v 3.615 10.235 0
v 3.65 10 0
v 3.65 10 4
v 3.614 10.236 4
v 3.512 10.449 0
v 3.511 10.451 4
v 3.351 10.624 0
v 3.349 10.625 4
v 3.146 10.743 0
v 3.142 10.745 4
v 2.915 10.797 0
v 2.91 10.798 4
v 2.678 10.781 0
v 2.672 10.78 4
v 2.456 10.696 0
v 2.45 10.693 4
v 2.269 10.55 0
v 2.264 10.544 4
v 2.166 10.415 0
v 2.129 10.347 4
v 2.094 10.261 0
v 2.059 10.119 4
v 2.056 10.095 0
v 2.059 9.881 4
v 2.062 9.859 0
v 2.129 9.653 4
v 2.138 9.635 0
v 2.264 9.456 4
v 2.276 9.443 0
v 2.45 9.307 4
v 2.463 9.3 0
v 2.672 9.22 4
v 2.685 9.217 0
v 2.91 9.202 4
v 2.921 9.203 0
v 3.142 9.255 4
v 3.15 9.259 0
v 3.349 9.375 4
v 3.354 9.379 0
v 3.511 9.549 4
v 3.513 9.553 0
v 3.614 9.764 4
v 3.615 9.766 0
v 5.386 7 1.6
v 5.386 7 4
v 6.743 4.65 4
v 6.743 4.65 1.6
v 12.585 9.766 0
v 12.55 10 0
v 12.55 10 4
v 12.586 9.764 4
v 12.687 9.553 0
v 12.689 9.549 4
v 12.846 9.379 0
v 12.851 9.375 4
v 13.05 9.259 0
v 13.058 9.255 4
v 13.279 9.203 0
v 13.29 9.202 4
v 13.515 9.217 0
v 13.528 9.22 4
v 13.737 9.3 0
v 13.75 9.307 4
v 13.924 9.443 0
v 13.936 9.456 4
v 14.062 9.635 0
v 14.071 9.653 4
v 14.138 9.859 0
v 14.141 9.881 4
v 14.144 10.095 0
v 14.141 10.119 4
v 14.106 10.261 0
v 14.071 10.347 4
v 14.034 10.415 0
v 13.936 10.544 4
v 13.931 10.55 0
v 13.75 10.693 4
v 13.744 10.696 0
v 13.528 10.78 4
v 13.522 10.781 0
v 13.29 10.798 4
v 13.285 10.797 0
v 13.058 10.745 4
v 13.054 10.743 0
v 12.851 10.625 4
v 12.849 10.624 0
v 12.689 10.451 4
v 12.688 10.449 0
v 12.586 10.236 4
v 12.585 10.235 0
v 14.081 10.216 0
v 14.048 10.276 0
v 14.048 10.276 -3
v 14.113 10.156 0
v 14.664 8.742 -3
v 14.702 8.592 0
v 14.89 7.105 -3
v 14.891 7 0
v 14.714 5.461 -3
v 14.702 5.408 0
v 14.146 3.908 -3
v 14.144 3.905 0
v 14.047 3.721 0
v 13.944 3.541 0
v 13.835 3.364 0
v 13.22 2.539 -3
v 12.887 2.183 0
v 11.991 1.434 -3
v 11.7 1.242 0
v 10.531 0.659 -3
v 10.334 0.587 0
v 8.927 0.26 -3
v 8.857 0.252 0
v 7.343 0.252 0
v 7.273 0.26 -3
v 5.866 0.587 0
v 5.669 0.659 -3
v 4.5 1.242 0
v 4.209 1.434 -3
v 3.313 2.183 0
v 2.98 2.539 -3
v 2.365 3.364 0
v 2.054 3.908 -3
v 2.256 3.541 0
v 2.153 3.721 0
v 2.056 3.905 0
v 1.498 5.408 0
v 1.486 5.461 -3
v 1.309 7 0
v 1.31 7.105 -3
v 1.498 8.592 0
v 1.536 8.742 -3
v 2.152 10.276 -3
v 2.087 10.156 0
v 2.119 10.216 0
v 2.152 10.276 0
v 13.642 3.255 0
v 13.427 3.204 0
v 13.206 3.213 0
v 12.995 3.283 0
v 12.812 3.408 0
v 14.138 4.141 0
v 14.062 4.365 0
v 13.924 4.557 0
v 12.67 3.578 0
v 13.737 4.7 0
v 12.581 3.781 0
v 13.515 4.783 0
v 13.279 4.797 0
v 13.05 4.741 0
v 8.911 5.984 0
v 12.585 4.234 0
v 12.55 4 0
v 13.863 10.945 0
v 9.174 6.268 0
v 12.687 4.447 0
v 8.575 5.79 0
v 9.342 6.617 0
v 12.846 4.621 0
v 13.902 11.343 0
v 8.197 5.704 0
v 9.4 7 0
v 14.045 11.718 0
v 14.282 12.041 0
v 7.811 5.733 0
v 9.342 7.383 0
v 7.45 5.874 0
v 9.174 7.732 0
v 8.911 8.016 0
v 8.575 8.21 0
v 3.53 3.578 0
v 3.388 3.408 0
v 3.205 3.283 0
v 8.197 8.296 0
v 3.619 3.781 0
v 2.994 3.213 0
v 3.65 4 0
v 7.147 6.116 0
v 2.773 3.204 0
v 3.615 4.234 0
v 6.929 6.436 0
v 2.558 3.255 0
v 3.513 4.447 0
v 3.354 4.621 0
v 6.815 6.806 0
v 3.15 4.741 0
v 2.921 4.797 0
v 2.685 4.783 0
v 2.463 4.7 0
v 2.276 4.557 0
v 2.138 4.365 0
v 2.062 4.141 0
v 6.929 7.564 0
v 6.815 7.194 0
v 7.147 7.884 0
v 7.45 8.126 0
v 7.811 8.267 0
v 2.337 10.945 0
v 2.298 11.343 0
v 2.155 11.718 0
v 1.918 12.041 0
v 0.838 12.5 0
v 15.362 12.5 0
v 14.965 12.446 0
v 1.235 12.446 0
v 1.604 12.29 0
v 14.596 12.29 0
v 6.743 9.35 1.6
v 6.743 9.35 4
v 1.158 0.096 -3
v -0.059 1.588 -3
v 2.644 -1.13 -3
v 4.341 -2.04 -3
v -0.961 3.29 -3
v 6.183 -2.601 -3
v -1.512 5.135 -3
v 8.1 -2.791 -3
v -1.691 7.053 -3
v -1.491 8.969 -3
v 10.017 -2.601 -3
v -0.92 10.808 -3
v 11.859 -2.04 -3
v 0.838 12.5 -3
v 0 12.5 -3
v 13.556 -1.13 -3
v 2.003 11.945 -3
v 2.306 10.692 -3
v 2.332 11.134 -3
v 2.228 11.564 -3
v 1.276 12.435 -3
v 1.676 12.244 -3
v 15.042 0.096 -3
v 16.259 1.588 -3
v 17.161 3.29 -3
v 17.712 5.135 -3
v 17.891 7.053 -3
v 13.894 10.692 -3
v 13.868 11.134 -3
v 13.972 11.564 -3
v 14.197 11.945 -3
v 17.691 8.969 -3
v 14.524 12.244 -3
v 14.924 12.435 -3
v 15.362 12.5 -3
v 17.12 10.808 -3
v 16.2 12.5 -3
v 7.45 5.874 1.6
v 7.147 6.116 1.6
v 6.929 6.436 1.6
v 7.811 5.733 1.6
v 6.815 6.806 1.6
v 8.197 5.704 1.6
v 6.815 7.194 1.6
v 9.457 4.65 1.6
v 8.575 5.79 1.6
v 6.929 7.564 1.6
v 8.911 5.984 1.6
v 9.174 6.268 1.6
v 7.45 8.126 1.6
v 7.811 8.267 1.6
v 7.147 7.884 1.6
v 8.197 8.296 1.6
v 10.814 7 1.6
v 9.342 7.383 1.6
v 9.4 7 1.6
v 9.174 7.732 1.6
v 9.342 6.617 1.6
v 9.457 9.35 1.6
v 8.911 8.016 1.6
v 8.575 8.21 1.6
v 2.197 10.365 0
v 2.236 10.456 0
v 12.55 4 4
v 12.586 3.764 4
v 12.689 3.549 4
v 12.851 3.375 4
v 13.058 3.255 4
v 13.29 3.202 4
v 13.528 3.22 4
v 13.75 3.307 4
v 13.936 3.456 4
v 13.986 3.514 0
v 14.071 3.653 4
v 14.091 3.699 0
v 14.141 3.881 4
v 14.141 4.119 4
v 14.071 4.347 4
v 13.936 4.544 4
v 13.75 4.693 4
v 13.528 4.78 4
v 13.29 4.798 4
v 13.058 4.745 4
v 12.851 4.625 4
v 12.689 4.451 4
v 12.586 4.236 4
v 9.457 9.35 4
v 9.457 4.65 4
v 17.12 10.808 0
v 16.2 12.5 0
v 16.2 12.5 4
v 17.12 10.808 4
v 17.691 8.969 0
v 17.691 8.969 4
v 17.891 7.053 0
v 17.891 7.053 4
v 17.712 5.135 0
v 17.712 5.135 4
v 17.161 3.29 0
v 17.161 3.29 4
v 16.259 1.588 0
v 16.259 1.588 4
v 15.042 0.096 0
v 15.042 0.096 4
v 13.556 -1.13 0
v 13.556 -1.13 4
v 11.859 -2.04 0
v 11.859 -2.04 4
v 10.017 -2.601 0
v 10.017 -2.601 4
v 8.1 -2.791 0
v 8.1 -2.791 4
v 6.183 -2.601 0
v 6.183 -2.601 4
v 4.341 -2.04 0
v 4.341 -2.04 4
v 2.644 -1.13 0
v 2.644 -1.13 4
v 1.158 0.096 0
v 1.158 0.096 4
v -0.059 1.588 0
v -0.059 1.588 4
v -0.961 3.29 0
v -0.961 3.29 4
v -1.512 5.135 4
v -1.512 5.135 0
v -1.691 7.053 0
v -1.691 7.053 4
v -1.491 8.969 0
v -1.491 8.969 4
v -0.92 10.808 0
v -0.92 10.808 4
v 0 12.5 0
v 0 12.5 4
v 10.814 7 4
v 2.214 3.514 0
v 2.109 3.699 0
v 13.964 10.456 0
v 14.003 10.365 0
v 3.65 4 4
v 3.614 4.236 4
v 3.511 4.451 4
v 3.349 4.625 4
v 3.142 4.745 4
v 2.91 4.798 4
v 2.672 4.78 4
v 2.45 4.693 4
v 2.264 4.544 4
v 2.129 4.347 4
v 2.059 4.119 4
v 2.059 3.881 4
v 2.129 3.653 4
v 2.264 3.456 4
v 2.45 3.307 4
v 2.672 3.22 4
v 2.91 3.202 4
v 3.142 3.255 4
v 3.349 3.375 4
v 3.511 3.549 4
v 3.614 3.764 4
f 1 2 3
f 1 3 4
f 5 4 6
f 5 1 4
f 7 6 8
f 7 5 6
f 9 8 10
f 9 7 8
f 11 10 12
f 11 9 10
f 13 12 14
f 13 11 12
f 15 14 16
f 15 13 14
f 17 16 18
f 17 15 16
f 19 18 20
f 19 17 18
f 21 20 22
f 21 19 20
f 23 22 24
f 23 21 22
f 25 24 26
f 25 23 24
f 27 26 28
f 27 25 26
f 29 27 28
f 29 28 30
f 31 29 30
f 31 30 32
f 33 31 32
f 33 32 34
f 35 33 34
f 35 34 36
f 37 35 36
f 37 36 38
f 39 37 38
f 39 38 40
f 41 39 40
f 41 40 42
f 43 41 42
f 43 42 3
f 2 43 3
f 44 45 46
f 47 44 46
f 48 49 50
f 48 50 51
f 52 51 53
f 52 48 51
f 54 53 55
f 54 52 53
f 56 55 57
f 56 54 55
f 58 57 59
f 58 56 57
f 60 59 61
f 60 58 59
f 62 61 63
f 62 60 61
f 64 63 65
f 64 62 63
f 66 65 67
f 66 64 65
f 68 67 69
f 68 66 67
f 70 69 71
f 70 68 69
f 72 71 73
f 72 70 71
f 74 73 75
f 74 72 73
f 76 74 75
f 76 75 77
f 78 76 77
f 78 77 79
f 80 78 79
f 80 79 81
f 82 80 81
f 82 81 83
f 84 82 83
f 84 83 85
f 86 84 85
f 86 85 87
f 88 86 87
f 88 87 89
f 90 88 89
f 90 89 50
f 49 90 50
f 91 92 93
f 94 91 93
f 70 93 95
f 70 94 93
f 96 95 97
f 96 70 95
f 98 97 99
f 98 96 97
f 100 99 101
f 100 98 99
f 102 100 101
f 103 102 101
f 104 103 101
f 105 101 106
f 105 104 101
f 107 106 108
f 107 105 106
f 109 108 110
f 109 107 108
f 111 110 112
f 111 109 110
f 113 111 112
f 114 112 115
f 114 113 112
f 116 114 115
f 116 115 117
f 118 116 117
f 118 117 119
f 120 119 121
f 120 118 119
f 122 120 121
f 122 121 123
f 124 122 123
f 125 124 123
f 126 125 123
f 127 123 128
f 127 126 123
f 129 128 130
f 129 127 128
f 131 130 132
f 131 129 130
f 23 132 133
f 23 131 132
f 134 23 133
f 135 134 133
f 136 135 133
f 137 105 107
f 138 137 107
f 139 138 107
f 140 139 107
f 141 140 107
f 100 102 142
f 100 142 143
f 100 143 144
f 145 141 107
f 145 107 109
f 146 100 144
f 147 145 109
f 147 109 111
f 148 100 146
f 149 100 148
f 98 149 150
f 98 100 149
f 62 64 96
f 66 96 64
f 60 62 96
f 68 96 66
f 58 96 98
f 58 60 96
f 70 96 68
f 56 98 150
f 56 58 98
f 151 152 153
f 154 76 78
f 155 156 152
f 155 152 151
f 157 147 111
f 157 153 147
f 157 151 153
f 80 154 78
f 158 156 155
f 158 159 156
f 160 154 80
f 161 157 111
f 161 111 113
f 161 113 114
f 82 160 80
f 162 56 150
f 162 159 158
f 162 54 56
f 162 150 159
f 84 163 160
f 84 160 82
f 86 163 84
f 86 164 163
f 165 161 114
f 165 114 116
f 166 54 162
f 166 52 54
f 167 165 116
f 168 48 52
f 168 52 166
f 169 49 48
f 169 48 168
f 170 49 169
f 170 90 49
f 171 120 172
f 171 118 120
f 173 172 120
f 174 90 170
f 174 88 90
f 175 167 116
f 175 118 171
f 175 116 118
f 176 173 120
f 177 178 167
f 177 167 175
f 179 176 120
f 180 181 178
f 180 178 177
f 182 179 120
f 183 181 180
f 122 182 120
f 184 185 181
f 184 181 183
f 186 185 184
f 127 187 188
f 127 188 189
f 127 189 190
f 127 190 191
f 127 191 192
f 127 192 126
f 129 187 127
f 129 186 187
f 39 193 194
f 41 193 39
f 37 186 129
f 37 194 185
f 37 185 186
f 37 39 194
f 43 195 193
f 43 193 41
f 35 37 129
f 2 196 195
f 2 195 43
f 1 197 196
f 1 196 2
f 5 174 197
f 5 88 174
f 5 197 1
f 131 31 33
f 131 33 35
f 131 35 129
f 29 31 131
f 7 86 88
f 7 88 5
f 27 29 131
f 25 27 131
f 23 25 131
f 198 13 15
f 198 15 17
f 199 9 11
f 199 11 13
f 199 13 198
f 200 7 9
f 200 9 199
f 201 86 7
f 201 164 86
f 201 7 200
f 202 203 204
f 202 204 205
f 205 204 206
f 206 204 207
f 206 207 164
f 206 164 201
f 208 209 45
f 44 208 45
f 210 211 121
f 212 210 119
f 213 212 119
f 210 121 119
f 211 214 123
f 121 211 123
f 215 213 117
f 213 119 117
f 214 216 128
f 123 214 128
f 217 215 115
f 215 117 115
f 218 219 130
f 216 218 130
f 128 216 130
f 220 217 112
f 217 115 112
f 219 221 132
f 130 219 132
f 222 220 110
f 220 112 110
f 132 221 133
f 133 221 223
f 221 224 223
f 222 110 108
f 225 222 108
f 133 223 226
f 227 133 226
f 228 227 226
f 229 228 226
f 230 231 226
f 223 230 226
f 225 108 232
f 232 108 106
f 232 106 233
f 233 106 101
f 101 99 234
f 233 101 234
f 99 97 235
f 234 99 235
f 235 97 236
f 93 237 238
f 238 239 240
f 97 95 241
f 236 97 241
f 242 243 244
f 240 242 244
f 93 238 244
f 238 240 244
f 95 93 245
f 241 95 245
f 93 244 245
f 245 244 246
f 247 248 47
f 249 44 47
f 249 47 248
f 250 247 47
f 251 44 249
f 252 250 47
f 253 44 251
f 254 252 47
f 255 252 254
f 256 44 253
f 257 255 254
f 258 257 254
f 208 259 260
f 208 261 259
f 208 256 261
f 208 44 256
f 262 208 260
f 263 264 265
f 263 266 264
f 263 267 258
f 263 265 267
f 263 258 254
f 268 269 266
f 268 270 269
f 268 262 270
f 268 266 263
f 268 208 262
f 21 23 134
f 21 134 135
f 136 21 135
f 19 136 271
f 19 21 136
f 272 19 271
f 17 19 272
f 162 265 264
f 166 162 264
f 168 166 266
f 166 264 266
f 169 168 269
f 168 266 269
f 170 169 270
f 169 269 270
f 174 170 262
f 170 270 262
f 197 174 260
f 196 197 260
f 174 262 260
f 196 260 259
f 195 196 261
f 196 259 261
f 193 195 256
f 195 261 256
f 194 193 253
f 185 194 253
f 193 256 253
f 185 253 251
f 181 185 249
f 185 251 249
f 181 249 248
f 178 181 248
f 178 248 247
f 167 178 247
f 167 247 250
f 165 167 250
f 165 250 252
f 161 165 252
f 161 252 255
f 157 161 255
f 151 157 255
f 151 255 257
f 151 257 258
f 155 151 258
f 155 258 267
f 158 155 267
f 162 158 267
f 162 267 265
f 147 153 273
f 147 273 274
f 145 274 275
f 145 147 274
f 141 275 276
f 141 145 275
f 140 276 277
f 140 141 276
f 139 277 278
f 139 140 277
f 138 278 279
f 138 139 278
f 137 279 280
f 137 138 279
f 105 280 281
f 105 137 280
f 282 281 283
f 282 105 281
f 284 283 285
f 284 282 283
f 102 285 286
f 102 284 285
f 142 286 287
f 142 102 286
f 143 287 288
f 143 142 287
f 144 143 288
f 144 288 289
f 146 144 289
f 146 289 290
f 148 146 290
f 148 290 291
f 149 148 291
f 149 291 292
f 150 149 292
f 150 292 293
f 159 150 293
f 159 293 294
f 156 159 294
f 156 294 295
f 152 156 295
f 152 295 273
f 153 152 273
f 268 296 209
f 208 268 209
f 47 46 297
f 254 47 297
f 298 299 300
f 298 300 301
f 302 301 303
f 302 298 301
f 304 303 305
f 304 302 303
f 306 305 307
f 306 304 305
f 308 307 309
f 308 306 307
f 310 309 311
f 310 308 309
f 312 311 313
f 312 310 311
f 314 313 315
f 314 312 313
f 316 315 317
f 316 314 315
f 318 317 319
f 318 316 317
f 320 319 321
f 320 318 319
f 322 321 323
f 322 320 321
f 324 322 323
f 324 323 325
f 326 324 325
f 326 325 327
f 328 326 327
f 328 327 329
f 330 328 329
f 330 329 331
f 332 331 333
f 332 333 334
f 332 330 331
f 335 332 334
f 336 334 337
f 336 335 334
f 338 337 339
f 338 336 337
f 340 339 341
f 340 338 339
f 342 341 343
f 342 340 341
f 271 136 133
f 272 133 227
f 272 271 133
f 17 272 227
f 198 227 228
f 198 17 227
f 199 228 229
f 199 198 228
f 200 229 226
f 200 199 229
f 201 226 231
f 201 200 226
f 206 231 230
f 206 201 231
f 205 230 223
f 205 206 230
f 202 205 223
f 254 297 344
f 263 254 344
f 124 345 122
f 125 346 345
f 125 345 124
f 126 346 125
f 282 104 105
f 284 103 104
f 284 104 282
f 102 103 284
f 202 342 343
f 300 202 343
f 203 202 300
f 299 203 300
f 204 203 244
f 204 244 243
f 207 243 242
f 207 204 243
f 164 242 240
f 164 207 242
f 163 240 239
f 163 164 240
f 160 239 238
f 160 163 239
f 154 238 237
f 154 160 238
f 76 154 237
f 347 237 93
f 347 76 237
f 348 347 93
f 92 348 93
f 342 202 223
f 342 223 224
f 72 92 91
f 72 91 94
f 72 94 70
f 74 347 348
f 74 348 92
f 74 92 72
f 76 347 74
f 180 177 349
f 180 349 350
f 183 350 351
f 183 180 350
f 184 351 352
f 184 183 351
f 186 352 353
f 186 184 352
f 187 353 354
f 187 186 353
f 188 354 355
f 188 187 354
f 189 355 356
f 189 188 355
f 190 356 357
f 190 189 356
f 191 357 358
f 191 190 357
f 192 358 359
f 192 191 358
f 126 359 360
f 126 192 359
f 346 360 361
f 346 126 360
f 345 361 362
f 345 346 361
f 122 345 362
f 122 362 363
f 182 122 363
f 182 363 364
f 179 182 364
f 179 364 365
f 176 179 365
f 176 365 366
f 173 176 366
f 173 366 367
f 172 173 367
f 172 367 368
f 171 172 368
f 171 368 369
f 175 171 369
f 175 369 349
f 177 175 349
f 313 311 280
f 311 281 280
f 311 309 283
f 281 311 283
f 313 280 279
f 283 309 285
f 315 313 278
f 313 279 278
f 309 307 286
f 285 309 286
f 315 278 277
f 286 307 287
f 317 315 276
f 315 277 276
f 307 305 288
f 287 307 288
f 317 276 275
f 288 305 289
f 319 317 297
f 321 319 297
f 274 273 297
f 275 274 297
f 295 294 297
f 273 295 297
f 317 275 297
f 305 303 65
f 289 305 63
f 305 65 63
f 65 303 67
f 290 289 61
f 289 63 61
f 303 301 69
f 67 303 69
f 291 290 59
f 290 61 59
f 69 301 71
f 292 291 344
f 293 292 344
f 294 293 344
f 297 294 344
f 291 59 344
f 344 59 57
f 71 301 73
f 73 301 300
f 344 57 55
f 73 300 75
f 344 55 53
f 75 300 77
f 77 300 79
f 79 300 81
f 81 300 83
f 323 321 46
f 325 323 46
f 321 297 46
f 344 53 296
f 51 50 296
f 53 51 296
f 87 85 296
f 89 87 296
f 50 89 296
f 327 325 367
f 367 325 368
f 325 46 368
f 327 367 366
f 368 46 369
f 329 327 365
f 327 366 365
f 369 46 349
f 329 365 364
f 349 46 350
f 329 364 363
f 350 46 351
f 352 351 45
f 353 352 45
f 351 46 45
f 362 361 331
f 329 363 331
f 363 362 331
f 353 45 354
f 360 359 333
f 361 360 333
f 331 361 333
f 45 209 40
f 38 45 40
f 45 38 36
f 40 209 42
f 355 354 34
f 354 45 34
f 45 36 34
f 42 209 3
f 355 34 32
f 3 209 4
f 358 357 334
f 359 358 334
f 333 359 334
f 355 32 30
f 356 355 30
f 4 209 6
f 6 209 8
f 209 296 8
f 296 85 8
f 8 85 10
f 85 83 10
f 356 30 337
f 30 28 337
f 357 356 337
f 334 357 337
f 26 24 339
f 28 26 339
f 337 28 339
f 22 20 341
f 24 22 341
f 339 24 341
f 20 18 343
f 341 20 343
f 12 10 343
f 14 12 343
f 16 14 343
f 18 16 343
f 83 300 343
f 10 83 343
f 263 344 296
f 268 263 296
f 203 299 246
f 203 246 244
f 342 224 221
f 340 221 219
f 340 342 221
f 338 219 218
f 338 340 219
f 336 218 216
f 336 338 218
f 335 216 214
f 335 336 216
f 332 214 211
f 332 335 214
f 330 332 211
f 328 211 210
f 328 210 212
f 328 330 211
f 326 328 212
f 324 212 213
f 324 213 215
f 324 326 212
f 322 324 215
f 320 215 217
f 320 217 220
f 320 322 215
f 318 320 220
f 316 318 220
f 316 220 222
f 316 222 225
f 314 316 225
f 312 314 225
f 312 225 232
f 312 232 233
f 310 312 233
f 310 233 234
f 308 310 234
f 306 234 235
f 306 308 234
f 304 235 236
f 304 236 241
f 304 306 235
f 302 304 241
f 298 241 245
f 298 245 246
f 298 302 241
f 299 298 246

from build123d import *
from build123d.topology import SkipClean

# Parameters (mm, degrees)
SKETCH1_R           = 0.8
BOSS_EXTRUDE1_DEPTH = 4
CUT_EXTRUDE1_DEPTH  = 2.4
SKETCH3_R           = 1.3
CUT_EXTRUDE2_DEPTH  = 4
BOSS_EXTRUDE2_DEPTH = 3


with BuildPart() as part:
    # Sketch1 → Boss-Extrude1 (new body)
    with BuildSketch(Plane.XY):
        with BuildLine():
            Line((0, 12.5), (16.2, 12.5))
            ThreePointArc((16.2, 12.5), (8.1, -2.790812019), (0, 12.5))
        make_face()
        with Locations((2.85, 10)):
            Circle(SKETCH1_R, mode=Mode.SUBTRACT)
        with Locations(Location((13.35, 10, 0), (0, 0, 180))):
            Circle(SKETCH1_R, mode=Mode.SUBTRACT)
        with Locations(Location((13.35, 4, 0), (0, 0, 180))):
            Circle(SKETCH1_R, mode=Mode.SUBTRACT)
        with Locations((2.85, 4)):
            Circle(SKETCH1_R, mode=Mode.SUBTRACT)
    extrude(amount=BOSS_EXTRUDE1_DEPTH)

    # Sketch2 → Cut-Extrude1 (cut)
    with BuildSketch(Plane.XY.offset(4)):
        Polygon((10.813546265, 7), (9.456773133, 9.35), (6.743226867, 9.35), (5.386453735, 7), (6.743226867, 4.65), (9.456773133, 4.65), align=None)
    extrude(amount=-CUT_EXTRUDE1_DEPTH, mode=Mode.SUBTRACT)

    # Sketch3 → Cut-Extrude2 (cut)
    with BuildSketch(Plane.XY.offset(4)):
        with Locations((8.1, 7)):
            Circle(SKETCH3_R)
    extrude(amount=-CUT_EXTRUDE2_DEPTH, mode=Mode.SUBTRACT)

    # Sketch4 → Boss-Extrude2 (add)
    with SkipClean():  # the faces are left unmerged after this step: merging them gives an invalid solid
        with BuildSketch(Plane.XY):
            with BuildLine():
                Line((16.2, 12.5), (15.362063339, 12.5))
                ThreePointArc((15.362063339, 12.5), (14.070641831, 11.763040292), (14.048187812, 10.276307316))
                ThreePointArc((14.048187812, 10.276307316), (8.1, 0.209187981), (2.151812188, 10.276307316))
                ThreePointArc((2.151812188, 10.276307316), (2.129358169, 11.763040292), (0.837936661, 12.5))
                Line((0.837936661, 12.5), (0, 12.5))
                ThreePointArc((0, 12.5), (8.1, -2.790812019), (16.2, 12.5))
            make_face()
        extrude(amount=-BOSS_EXTRUDE2_DEPTH)


solid = part.part
